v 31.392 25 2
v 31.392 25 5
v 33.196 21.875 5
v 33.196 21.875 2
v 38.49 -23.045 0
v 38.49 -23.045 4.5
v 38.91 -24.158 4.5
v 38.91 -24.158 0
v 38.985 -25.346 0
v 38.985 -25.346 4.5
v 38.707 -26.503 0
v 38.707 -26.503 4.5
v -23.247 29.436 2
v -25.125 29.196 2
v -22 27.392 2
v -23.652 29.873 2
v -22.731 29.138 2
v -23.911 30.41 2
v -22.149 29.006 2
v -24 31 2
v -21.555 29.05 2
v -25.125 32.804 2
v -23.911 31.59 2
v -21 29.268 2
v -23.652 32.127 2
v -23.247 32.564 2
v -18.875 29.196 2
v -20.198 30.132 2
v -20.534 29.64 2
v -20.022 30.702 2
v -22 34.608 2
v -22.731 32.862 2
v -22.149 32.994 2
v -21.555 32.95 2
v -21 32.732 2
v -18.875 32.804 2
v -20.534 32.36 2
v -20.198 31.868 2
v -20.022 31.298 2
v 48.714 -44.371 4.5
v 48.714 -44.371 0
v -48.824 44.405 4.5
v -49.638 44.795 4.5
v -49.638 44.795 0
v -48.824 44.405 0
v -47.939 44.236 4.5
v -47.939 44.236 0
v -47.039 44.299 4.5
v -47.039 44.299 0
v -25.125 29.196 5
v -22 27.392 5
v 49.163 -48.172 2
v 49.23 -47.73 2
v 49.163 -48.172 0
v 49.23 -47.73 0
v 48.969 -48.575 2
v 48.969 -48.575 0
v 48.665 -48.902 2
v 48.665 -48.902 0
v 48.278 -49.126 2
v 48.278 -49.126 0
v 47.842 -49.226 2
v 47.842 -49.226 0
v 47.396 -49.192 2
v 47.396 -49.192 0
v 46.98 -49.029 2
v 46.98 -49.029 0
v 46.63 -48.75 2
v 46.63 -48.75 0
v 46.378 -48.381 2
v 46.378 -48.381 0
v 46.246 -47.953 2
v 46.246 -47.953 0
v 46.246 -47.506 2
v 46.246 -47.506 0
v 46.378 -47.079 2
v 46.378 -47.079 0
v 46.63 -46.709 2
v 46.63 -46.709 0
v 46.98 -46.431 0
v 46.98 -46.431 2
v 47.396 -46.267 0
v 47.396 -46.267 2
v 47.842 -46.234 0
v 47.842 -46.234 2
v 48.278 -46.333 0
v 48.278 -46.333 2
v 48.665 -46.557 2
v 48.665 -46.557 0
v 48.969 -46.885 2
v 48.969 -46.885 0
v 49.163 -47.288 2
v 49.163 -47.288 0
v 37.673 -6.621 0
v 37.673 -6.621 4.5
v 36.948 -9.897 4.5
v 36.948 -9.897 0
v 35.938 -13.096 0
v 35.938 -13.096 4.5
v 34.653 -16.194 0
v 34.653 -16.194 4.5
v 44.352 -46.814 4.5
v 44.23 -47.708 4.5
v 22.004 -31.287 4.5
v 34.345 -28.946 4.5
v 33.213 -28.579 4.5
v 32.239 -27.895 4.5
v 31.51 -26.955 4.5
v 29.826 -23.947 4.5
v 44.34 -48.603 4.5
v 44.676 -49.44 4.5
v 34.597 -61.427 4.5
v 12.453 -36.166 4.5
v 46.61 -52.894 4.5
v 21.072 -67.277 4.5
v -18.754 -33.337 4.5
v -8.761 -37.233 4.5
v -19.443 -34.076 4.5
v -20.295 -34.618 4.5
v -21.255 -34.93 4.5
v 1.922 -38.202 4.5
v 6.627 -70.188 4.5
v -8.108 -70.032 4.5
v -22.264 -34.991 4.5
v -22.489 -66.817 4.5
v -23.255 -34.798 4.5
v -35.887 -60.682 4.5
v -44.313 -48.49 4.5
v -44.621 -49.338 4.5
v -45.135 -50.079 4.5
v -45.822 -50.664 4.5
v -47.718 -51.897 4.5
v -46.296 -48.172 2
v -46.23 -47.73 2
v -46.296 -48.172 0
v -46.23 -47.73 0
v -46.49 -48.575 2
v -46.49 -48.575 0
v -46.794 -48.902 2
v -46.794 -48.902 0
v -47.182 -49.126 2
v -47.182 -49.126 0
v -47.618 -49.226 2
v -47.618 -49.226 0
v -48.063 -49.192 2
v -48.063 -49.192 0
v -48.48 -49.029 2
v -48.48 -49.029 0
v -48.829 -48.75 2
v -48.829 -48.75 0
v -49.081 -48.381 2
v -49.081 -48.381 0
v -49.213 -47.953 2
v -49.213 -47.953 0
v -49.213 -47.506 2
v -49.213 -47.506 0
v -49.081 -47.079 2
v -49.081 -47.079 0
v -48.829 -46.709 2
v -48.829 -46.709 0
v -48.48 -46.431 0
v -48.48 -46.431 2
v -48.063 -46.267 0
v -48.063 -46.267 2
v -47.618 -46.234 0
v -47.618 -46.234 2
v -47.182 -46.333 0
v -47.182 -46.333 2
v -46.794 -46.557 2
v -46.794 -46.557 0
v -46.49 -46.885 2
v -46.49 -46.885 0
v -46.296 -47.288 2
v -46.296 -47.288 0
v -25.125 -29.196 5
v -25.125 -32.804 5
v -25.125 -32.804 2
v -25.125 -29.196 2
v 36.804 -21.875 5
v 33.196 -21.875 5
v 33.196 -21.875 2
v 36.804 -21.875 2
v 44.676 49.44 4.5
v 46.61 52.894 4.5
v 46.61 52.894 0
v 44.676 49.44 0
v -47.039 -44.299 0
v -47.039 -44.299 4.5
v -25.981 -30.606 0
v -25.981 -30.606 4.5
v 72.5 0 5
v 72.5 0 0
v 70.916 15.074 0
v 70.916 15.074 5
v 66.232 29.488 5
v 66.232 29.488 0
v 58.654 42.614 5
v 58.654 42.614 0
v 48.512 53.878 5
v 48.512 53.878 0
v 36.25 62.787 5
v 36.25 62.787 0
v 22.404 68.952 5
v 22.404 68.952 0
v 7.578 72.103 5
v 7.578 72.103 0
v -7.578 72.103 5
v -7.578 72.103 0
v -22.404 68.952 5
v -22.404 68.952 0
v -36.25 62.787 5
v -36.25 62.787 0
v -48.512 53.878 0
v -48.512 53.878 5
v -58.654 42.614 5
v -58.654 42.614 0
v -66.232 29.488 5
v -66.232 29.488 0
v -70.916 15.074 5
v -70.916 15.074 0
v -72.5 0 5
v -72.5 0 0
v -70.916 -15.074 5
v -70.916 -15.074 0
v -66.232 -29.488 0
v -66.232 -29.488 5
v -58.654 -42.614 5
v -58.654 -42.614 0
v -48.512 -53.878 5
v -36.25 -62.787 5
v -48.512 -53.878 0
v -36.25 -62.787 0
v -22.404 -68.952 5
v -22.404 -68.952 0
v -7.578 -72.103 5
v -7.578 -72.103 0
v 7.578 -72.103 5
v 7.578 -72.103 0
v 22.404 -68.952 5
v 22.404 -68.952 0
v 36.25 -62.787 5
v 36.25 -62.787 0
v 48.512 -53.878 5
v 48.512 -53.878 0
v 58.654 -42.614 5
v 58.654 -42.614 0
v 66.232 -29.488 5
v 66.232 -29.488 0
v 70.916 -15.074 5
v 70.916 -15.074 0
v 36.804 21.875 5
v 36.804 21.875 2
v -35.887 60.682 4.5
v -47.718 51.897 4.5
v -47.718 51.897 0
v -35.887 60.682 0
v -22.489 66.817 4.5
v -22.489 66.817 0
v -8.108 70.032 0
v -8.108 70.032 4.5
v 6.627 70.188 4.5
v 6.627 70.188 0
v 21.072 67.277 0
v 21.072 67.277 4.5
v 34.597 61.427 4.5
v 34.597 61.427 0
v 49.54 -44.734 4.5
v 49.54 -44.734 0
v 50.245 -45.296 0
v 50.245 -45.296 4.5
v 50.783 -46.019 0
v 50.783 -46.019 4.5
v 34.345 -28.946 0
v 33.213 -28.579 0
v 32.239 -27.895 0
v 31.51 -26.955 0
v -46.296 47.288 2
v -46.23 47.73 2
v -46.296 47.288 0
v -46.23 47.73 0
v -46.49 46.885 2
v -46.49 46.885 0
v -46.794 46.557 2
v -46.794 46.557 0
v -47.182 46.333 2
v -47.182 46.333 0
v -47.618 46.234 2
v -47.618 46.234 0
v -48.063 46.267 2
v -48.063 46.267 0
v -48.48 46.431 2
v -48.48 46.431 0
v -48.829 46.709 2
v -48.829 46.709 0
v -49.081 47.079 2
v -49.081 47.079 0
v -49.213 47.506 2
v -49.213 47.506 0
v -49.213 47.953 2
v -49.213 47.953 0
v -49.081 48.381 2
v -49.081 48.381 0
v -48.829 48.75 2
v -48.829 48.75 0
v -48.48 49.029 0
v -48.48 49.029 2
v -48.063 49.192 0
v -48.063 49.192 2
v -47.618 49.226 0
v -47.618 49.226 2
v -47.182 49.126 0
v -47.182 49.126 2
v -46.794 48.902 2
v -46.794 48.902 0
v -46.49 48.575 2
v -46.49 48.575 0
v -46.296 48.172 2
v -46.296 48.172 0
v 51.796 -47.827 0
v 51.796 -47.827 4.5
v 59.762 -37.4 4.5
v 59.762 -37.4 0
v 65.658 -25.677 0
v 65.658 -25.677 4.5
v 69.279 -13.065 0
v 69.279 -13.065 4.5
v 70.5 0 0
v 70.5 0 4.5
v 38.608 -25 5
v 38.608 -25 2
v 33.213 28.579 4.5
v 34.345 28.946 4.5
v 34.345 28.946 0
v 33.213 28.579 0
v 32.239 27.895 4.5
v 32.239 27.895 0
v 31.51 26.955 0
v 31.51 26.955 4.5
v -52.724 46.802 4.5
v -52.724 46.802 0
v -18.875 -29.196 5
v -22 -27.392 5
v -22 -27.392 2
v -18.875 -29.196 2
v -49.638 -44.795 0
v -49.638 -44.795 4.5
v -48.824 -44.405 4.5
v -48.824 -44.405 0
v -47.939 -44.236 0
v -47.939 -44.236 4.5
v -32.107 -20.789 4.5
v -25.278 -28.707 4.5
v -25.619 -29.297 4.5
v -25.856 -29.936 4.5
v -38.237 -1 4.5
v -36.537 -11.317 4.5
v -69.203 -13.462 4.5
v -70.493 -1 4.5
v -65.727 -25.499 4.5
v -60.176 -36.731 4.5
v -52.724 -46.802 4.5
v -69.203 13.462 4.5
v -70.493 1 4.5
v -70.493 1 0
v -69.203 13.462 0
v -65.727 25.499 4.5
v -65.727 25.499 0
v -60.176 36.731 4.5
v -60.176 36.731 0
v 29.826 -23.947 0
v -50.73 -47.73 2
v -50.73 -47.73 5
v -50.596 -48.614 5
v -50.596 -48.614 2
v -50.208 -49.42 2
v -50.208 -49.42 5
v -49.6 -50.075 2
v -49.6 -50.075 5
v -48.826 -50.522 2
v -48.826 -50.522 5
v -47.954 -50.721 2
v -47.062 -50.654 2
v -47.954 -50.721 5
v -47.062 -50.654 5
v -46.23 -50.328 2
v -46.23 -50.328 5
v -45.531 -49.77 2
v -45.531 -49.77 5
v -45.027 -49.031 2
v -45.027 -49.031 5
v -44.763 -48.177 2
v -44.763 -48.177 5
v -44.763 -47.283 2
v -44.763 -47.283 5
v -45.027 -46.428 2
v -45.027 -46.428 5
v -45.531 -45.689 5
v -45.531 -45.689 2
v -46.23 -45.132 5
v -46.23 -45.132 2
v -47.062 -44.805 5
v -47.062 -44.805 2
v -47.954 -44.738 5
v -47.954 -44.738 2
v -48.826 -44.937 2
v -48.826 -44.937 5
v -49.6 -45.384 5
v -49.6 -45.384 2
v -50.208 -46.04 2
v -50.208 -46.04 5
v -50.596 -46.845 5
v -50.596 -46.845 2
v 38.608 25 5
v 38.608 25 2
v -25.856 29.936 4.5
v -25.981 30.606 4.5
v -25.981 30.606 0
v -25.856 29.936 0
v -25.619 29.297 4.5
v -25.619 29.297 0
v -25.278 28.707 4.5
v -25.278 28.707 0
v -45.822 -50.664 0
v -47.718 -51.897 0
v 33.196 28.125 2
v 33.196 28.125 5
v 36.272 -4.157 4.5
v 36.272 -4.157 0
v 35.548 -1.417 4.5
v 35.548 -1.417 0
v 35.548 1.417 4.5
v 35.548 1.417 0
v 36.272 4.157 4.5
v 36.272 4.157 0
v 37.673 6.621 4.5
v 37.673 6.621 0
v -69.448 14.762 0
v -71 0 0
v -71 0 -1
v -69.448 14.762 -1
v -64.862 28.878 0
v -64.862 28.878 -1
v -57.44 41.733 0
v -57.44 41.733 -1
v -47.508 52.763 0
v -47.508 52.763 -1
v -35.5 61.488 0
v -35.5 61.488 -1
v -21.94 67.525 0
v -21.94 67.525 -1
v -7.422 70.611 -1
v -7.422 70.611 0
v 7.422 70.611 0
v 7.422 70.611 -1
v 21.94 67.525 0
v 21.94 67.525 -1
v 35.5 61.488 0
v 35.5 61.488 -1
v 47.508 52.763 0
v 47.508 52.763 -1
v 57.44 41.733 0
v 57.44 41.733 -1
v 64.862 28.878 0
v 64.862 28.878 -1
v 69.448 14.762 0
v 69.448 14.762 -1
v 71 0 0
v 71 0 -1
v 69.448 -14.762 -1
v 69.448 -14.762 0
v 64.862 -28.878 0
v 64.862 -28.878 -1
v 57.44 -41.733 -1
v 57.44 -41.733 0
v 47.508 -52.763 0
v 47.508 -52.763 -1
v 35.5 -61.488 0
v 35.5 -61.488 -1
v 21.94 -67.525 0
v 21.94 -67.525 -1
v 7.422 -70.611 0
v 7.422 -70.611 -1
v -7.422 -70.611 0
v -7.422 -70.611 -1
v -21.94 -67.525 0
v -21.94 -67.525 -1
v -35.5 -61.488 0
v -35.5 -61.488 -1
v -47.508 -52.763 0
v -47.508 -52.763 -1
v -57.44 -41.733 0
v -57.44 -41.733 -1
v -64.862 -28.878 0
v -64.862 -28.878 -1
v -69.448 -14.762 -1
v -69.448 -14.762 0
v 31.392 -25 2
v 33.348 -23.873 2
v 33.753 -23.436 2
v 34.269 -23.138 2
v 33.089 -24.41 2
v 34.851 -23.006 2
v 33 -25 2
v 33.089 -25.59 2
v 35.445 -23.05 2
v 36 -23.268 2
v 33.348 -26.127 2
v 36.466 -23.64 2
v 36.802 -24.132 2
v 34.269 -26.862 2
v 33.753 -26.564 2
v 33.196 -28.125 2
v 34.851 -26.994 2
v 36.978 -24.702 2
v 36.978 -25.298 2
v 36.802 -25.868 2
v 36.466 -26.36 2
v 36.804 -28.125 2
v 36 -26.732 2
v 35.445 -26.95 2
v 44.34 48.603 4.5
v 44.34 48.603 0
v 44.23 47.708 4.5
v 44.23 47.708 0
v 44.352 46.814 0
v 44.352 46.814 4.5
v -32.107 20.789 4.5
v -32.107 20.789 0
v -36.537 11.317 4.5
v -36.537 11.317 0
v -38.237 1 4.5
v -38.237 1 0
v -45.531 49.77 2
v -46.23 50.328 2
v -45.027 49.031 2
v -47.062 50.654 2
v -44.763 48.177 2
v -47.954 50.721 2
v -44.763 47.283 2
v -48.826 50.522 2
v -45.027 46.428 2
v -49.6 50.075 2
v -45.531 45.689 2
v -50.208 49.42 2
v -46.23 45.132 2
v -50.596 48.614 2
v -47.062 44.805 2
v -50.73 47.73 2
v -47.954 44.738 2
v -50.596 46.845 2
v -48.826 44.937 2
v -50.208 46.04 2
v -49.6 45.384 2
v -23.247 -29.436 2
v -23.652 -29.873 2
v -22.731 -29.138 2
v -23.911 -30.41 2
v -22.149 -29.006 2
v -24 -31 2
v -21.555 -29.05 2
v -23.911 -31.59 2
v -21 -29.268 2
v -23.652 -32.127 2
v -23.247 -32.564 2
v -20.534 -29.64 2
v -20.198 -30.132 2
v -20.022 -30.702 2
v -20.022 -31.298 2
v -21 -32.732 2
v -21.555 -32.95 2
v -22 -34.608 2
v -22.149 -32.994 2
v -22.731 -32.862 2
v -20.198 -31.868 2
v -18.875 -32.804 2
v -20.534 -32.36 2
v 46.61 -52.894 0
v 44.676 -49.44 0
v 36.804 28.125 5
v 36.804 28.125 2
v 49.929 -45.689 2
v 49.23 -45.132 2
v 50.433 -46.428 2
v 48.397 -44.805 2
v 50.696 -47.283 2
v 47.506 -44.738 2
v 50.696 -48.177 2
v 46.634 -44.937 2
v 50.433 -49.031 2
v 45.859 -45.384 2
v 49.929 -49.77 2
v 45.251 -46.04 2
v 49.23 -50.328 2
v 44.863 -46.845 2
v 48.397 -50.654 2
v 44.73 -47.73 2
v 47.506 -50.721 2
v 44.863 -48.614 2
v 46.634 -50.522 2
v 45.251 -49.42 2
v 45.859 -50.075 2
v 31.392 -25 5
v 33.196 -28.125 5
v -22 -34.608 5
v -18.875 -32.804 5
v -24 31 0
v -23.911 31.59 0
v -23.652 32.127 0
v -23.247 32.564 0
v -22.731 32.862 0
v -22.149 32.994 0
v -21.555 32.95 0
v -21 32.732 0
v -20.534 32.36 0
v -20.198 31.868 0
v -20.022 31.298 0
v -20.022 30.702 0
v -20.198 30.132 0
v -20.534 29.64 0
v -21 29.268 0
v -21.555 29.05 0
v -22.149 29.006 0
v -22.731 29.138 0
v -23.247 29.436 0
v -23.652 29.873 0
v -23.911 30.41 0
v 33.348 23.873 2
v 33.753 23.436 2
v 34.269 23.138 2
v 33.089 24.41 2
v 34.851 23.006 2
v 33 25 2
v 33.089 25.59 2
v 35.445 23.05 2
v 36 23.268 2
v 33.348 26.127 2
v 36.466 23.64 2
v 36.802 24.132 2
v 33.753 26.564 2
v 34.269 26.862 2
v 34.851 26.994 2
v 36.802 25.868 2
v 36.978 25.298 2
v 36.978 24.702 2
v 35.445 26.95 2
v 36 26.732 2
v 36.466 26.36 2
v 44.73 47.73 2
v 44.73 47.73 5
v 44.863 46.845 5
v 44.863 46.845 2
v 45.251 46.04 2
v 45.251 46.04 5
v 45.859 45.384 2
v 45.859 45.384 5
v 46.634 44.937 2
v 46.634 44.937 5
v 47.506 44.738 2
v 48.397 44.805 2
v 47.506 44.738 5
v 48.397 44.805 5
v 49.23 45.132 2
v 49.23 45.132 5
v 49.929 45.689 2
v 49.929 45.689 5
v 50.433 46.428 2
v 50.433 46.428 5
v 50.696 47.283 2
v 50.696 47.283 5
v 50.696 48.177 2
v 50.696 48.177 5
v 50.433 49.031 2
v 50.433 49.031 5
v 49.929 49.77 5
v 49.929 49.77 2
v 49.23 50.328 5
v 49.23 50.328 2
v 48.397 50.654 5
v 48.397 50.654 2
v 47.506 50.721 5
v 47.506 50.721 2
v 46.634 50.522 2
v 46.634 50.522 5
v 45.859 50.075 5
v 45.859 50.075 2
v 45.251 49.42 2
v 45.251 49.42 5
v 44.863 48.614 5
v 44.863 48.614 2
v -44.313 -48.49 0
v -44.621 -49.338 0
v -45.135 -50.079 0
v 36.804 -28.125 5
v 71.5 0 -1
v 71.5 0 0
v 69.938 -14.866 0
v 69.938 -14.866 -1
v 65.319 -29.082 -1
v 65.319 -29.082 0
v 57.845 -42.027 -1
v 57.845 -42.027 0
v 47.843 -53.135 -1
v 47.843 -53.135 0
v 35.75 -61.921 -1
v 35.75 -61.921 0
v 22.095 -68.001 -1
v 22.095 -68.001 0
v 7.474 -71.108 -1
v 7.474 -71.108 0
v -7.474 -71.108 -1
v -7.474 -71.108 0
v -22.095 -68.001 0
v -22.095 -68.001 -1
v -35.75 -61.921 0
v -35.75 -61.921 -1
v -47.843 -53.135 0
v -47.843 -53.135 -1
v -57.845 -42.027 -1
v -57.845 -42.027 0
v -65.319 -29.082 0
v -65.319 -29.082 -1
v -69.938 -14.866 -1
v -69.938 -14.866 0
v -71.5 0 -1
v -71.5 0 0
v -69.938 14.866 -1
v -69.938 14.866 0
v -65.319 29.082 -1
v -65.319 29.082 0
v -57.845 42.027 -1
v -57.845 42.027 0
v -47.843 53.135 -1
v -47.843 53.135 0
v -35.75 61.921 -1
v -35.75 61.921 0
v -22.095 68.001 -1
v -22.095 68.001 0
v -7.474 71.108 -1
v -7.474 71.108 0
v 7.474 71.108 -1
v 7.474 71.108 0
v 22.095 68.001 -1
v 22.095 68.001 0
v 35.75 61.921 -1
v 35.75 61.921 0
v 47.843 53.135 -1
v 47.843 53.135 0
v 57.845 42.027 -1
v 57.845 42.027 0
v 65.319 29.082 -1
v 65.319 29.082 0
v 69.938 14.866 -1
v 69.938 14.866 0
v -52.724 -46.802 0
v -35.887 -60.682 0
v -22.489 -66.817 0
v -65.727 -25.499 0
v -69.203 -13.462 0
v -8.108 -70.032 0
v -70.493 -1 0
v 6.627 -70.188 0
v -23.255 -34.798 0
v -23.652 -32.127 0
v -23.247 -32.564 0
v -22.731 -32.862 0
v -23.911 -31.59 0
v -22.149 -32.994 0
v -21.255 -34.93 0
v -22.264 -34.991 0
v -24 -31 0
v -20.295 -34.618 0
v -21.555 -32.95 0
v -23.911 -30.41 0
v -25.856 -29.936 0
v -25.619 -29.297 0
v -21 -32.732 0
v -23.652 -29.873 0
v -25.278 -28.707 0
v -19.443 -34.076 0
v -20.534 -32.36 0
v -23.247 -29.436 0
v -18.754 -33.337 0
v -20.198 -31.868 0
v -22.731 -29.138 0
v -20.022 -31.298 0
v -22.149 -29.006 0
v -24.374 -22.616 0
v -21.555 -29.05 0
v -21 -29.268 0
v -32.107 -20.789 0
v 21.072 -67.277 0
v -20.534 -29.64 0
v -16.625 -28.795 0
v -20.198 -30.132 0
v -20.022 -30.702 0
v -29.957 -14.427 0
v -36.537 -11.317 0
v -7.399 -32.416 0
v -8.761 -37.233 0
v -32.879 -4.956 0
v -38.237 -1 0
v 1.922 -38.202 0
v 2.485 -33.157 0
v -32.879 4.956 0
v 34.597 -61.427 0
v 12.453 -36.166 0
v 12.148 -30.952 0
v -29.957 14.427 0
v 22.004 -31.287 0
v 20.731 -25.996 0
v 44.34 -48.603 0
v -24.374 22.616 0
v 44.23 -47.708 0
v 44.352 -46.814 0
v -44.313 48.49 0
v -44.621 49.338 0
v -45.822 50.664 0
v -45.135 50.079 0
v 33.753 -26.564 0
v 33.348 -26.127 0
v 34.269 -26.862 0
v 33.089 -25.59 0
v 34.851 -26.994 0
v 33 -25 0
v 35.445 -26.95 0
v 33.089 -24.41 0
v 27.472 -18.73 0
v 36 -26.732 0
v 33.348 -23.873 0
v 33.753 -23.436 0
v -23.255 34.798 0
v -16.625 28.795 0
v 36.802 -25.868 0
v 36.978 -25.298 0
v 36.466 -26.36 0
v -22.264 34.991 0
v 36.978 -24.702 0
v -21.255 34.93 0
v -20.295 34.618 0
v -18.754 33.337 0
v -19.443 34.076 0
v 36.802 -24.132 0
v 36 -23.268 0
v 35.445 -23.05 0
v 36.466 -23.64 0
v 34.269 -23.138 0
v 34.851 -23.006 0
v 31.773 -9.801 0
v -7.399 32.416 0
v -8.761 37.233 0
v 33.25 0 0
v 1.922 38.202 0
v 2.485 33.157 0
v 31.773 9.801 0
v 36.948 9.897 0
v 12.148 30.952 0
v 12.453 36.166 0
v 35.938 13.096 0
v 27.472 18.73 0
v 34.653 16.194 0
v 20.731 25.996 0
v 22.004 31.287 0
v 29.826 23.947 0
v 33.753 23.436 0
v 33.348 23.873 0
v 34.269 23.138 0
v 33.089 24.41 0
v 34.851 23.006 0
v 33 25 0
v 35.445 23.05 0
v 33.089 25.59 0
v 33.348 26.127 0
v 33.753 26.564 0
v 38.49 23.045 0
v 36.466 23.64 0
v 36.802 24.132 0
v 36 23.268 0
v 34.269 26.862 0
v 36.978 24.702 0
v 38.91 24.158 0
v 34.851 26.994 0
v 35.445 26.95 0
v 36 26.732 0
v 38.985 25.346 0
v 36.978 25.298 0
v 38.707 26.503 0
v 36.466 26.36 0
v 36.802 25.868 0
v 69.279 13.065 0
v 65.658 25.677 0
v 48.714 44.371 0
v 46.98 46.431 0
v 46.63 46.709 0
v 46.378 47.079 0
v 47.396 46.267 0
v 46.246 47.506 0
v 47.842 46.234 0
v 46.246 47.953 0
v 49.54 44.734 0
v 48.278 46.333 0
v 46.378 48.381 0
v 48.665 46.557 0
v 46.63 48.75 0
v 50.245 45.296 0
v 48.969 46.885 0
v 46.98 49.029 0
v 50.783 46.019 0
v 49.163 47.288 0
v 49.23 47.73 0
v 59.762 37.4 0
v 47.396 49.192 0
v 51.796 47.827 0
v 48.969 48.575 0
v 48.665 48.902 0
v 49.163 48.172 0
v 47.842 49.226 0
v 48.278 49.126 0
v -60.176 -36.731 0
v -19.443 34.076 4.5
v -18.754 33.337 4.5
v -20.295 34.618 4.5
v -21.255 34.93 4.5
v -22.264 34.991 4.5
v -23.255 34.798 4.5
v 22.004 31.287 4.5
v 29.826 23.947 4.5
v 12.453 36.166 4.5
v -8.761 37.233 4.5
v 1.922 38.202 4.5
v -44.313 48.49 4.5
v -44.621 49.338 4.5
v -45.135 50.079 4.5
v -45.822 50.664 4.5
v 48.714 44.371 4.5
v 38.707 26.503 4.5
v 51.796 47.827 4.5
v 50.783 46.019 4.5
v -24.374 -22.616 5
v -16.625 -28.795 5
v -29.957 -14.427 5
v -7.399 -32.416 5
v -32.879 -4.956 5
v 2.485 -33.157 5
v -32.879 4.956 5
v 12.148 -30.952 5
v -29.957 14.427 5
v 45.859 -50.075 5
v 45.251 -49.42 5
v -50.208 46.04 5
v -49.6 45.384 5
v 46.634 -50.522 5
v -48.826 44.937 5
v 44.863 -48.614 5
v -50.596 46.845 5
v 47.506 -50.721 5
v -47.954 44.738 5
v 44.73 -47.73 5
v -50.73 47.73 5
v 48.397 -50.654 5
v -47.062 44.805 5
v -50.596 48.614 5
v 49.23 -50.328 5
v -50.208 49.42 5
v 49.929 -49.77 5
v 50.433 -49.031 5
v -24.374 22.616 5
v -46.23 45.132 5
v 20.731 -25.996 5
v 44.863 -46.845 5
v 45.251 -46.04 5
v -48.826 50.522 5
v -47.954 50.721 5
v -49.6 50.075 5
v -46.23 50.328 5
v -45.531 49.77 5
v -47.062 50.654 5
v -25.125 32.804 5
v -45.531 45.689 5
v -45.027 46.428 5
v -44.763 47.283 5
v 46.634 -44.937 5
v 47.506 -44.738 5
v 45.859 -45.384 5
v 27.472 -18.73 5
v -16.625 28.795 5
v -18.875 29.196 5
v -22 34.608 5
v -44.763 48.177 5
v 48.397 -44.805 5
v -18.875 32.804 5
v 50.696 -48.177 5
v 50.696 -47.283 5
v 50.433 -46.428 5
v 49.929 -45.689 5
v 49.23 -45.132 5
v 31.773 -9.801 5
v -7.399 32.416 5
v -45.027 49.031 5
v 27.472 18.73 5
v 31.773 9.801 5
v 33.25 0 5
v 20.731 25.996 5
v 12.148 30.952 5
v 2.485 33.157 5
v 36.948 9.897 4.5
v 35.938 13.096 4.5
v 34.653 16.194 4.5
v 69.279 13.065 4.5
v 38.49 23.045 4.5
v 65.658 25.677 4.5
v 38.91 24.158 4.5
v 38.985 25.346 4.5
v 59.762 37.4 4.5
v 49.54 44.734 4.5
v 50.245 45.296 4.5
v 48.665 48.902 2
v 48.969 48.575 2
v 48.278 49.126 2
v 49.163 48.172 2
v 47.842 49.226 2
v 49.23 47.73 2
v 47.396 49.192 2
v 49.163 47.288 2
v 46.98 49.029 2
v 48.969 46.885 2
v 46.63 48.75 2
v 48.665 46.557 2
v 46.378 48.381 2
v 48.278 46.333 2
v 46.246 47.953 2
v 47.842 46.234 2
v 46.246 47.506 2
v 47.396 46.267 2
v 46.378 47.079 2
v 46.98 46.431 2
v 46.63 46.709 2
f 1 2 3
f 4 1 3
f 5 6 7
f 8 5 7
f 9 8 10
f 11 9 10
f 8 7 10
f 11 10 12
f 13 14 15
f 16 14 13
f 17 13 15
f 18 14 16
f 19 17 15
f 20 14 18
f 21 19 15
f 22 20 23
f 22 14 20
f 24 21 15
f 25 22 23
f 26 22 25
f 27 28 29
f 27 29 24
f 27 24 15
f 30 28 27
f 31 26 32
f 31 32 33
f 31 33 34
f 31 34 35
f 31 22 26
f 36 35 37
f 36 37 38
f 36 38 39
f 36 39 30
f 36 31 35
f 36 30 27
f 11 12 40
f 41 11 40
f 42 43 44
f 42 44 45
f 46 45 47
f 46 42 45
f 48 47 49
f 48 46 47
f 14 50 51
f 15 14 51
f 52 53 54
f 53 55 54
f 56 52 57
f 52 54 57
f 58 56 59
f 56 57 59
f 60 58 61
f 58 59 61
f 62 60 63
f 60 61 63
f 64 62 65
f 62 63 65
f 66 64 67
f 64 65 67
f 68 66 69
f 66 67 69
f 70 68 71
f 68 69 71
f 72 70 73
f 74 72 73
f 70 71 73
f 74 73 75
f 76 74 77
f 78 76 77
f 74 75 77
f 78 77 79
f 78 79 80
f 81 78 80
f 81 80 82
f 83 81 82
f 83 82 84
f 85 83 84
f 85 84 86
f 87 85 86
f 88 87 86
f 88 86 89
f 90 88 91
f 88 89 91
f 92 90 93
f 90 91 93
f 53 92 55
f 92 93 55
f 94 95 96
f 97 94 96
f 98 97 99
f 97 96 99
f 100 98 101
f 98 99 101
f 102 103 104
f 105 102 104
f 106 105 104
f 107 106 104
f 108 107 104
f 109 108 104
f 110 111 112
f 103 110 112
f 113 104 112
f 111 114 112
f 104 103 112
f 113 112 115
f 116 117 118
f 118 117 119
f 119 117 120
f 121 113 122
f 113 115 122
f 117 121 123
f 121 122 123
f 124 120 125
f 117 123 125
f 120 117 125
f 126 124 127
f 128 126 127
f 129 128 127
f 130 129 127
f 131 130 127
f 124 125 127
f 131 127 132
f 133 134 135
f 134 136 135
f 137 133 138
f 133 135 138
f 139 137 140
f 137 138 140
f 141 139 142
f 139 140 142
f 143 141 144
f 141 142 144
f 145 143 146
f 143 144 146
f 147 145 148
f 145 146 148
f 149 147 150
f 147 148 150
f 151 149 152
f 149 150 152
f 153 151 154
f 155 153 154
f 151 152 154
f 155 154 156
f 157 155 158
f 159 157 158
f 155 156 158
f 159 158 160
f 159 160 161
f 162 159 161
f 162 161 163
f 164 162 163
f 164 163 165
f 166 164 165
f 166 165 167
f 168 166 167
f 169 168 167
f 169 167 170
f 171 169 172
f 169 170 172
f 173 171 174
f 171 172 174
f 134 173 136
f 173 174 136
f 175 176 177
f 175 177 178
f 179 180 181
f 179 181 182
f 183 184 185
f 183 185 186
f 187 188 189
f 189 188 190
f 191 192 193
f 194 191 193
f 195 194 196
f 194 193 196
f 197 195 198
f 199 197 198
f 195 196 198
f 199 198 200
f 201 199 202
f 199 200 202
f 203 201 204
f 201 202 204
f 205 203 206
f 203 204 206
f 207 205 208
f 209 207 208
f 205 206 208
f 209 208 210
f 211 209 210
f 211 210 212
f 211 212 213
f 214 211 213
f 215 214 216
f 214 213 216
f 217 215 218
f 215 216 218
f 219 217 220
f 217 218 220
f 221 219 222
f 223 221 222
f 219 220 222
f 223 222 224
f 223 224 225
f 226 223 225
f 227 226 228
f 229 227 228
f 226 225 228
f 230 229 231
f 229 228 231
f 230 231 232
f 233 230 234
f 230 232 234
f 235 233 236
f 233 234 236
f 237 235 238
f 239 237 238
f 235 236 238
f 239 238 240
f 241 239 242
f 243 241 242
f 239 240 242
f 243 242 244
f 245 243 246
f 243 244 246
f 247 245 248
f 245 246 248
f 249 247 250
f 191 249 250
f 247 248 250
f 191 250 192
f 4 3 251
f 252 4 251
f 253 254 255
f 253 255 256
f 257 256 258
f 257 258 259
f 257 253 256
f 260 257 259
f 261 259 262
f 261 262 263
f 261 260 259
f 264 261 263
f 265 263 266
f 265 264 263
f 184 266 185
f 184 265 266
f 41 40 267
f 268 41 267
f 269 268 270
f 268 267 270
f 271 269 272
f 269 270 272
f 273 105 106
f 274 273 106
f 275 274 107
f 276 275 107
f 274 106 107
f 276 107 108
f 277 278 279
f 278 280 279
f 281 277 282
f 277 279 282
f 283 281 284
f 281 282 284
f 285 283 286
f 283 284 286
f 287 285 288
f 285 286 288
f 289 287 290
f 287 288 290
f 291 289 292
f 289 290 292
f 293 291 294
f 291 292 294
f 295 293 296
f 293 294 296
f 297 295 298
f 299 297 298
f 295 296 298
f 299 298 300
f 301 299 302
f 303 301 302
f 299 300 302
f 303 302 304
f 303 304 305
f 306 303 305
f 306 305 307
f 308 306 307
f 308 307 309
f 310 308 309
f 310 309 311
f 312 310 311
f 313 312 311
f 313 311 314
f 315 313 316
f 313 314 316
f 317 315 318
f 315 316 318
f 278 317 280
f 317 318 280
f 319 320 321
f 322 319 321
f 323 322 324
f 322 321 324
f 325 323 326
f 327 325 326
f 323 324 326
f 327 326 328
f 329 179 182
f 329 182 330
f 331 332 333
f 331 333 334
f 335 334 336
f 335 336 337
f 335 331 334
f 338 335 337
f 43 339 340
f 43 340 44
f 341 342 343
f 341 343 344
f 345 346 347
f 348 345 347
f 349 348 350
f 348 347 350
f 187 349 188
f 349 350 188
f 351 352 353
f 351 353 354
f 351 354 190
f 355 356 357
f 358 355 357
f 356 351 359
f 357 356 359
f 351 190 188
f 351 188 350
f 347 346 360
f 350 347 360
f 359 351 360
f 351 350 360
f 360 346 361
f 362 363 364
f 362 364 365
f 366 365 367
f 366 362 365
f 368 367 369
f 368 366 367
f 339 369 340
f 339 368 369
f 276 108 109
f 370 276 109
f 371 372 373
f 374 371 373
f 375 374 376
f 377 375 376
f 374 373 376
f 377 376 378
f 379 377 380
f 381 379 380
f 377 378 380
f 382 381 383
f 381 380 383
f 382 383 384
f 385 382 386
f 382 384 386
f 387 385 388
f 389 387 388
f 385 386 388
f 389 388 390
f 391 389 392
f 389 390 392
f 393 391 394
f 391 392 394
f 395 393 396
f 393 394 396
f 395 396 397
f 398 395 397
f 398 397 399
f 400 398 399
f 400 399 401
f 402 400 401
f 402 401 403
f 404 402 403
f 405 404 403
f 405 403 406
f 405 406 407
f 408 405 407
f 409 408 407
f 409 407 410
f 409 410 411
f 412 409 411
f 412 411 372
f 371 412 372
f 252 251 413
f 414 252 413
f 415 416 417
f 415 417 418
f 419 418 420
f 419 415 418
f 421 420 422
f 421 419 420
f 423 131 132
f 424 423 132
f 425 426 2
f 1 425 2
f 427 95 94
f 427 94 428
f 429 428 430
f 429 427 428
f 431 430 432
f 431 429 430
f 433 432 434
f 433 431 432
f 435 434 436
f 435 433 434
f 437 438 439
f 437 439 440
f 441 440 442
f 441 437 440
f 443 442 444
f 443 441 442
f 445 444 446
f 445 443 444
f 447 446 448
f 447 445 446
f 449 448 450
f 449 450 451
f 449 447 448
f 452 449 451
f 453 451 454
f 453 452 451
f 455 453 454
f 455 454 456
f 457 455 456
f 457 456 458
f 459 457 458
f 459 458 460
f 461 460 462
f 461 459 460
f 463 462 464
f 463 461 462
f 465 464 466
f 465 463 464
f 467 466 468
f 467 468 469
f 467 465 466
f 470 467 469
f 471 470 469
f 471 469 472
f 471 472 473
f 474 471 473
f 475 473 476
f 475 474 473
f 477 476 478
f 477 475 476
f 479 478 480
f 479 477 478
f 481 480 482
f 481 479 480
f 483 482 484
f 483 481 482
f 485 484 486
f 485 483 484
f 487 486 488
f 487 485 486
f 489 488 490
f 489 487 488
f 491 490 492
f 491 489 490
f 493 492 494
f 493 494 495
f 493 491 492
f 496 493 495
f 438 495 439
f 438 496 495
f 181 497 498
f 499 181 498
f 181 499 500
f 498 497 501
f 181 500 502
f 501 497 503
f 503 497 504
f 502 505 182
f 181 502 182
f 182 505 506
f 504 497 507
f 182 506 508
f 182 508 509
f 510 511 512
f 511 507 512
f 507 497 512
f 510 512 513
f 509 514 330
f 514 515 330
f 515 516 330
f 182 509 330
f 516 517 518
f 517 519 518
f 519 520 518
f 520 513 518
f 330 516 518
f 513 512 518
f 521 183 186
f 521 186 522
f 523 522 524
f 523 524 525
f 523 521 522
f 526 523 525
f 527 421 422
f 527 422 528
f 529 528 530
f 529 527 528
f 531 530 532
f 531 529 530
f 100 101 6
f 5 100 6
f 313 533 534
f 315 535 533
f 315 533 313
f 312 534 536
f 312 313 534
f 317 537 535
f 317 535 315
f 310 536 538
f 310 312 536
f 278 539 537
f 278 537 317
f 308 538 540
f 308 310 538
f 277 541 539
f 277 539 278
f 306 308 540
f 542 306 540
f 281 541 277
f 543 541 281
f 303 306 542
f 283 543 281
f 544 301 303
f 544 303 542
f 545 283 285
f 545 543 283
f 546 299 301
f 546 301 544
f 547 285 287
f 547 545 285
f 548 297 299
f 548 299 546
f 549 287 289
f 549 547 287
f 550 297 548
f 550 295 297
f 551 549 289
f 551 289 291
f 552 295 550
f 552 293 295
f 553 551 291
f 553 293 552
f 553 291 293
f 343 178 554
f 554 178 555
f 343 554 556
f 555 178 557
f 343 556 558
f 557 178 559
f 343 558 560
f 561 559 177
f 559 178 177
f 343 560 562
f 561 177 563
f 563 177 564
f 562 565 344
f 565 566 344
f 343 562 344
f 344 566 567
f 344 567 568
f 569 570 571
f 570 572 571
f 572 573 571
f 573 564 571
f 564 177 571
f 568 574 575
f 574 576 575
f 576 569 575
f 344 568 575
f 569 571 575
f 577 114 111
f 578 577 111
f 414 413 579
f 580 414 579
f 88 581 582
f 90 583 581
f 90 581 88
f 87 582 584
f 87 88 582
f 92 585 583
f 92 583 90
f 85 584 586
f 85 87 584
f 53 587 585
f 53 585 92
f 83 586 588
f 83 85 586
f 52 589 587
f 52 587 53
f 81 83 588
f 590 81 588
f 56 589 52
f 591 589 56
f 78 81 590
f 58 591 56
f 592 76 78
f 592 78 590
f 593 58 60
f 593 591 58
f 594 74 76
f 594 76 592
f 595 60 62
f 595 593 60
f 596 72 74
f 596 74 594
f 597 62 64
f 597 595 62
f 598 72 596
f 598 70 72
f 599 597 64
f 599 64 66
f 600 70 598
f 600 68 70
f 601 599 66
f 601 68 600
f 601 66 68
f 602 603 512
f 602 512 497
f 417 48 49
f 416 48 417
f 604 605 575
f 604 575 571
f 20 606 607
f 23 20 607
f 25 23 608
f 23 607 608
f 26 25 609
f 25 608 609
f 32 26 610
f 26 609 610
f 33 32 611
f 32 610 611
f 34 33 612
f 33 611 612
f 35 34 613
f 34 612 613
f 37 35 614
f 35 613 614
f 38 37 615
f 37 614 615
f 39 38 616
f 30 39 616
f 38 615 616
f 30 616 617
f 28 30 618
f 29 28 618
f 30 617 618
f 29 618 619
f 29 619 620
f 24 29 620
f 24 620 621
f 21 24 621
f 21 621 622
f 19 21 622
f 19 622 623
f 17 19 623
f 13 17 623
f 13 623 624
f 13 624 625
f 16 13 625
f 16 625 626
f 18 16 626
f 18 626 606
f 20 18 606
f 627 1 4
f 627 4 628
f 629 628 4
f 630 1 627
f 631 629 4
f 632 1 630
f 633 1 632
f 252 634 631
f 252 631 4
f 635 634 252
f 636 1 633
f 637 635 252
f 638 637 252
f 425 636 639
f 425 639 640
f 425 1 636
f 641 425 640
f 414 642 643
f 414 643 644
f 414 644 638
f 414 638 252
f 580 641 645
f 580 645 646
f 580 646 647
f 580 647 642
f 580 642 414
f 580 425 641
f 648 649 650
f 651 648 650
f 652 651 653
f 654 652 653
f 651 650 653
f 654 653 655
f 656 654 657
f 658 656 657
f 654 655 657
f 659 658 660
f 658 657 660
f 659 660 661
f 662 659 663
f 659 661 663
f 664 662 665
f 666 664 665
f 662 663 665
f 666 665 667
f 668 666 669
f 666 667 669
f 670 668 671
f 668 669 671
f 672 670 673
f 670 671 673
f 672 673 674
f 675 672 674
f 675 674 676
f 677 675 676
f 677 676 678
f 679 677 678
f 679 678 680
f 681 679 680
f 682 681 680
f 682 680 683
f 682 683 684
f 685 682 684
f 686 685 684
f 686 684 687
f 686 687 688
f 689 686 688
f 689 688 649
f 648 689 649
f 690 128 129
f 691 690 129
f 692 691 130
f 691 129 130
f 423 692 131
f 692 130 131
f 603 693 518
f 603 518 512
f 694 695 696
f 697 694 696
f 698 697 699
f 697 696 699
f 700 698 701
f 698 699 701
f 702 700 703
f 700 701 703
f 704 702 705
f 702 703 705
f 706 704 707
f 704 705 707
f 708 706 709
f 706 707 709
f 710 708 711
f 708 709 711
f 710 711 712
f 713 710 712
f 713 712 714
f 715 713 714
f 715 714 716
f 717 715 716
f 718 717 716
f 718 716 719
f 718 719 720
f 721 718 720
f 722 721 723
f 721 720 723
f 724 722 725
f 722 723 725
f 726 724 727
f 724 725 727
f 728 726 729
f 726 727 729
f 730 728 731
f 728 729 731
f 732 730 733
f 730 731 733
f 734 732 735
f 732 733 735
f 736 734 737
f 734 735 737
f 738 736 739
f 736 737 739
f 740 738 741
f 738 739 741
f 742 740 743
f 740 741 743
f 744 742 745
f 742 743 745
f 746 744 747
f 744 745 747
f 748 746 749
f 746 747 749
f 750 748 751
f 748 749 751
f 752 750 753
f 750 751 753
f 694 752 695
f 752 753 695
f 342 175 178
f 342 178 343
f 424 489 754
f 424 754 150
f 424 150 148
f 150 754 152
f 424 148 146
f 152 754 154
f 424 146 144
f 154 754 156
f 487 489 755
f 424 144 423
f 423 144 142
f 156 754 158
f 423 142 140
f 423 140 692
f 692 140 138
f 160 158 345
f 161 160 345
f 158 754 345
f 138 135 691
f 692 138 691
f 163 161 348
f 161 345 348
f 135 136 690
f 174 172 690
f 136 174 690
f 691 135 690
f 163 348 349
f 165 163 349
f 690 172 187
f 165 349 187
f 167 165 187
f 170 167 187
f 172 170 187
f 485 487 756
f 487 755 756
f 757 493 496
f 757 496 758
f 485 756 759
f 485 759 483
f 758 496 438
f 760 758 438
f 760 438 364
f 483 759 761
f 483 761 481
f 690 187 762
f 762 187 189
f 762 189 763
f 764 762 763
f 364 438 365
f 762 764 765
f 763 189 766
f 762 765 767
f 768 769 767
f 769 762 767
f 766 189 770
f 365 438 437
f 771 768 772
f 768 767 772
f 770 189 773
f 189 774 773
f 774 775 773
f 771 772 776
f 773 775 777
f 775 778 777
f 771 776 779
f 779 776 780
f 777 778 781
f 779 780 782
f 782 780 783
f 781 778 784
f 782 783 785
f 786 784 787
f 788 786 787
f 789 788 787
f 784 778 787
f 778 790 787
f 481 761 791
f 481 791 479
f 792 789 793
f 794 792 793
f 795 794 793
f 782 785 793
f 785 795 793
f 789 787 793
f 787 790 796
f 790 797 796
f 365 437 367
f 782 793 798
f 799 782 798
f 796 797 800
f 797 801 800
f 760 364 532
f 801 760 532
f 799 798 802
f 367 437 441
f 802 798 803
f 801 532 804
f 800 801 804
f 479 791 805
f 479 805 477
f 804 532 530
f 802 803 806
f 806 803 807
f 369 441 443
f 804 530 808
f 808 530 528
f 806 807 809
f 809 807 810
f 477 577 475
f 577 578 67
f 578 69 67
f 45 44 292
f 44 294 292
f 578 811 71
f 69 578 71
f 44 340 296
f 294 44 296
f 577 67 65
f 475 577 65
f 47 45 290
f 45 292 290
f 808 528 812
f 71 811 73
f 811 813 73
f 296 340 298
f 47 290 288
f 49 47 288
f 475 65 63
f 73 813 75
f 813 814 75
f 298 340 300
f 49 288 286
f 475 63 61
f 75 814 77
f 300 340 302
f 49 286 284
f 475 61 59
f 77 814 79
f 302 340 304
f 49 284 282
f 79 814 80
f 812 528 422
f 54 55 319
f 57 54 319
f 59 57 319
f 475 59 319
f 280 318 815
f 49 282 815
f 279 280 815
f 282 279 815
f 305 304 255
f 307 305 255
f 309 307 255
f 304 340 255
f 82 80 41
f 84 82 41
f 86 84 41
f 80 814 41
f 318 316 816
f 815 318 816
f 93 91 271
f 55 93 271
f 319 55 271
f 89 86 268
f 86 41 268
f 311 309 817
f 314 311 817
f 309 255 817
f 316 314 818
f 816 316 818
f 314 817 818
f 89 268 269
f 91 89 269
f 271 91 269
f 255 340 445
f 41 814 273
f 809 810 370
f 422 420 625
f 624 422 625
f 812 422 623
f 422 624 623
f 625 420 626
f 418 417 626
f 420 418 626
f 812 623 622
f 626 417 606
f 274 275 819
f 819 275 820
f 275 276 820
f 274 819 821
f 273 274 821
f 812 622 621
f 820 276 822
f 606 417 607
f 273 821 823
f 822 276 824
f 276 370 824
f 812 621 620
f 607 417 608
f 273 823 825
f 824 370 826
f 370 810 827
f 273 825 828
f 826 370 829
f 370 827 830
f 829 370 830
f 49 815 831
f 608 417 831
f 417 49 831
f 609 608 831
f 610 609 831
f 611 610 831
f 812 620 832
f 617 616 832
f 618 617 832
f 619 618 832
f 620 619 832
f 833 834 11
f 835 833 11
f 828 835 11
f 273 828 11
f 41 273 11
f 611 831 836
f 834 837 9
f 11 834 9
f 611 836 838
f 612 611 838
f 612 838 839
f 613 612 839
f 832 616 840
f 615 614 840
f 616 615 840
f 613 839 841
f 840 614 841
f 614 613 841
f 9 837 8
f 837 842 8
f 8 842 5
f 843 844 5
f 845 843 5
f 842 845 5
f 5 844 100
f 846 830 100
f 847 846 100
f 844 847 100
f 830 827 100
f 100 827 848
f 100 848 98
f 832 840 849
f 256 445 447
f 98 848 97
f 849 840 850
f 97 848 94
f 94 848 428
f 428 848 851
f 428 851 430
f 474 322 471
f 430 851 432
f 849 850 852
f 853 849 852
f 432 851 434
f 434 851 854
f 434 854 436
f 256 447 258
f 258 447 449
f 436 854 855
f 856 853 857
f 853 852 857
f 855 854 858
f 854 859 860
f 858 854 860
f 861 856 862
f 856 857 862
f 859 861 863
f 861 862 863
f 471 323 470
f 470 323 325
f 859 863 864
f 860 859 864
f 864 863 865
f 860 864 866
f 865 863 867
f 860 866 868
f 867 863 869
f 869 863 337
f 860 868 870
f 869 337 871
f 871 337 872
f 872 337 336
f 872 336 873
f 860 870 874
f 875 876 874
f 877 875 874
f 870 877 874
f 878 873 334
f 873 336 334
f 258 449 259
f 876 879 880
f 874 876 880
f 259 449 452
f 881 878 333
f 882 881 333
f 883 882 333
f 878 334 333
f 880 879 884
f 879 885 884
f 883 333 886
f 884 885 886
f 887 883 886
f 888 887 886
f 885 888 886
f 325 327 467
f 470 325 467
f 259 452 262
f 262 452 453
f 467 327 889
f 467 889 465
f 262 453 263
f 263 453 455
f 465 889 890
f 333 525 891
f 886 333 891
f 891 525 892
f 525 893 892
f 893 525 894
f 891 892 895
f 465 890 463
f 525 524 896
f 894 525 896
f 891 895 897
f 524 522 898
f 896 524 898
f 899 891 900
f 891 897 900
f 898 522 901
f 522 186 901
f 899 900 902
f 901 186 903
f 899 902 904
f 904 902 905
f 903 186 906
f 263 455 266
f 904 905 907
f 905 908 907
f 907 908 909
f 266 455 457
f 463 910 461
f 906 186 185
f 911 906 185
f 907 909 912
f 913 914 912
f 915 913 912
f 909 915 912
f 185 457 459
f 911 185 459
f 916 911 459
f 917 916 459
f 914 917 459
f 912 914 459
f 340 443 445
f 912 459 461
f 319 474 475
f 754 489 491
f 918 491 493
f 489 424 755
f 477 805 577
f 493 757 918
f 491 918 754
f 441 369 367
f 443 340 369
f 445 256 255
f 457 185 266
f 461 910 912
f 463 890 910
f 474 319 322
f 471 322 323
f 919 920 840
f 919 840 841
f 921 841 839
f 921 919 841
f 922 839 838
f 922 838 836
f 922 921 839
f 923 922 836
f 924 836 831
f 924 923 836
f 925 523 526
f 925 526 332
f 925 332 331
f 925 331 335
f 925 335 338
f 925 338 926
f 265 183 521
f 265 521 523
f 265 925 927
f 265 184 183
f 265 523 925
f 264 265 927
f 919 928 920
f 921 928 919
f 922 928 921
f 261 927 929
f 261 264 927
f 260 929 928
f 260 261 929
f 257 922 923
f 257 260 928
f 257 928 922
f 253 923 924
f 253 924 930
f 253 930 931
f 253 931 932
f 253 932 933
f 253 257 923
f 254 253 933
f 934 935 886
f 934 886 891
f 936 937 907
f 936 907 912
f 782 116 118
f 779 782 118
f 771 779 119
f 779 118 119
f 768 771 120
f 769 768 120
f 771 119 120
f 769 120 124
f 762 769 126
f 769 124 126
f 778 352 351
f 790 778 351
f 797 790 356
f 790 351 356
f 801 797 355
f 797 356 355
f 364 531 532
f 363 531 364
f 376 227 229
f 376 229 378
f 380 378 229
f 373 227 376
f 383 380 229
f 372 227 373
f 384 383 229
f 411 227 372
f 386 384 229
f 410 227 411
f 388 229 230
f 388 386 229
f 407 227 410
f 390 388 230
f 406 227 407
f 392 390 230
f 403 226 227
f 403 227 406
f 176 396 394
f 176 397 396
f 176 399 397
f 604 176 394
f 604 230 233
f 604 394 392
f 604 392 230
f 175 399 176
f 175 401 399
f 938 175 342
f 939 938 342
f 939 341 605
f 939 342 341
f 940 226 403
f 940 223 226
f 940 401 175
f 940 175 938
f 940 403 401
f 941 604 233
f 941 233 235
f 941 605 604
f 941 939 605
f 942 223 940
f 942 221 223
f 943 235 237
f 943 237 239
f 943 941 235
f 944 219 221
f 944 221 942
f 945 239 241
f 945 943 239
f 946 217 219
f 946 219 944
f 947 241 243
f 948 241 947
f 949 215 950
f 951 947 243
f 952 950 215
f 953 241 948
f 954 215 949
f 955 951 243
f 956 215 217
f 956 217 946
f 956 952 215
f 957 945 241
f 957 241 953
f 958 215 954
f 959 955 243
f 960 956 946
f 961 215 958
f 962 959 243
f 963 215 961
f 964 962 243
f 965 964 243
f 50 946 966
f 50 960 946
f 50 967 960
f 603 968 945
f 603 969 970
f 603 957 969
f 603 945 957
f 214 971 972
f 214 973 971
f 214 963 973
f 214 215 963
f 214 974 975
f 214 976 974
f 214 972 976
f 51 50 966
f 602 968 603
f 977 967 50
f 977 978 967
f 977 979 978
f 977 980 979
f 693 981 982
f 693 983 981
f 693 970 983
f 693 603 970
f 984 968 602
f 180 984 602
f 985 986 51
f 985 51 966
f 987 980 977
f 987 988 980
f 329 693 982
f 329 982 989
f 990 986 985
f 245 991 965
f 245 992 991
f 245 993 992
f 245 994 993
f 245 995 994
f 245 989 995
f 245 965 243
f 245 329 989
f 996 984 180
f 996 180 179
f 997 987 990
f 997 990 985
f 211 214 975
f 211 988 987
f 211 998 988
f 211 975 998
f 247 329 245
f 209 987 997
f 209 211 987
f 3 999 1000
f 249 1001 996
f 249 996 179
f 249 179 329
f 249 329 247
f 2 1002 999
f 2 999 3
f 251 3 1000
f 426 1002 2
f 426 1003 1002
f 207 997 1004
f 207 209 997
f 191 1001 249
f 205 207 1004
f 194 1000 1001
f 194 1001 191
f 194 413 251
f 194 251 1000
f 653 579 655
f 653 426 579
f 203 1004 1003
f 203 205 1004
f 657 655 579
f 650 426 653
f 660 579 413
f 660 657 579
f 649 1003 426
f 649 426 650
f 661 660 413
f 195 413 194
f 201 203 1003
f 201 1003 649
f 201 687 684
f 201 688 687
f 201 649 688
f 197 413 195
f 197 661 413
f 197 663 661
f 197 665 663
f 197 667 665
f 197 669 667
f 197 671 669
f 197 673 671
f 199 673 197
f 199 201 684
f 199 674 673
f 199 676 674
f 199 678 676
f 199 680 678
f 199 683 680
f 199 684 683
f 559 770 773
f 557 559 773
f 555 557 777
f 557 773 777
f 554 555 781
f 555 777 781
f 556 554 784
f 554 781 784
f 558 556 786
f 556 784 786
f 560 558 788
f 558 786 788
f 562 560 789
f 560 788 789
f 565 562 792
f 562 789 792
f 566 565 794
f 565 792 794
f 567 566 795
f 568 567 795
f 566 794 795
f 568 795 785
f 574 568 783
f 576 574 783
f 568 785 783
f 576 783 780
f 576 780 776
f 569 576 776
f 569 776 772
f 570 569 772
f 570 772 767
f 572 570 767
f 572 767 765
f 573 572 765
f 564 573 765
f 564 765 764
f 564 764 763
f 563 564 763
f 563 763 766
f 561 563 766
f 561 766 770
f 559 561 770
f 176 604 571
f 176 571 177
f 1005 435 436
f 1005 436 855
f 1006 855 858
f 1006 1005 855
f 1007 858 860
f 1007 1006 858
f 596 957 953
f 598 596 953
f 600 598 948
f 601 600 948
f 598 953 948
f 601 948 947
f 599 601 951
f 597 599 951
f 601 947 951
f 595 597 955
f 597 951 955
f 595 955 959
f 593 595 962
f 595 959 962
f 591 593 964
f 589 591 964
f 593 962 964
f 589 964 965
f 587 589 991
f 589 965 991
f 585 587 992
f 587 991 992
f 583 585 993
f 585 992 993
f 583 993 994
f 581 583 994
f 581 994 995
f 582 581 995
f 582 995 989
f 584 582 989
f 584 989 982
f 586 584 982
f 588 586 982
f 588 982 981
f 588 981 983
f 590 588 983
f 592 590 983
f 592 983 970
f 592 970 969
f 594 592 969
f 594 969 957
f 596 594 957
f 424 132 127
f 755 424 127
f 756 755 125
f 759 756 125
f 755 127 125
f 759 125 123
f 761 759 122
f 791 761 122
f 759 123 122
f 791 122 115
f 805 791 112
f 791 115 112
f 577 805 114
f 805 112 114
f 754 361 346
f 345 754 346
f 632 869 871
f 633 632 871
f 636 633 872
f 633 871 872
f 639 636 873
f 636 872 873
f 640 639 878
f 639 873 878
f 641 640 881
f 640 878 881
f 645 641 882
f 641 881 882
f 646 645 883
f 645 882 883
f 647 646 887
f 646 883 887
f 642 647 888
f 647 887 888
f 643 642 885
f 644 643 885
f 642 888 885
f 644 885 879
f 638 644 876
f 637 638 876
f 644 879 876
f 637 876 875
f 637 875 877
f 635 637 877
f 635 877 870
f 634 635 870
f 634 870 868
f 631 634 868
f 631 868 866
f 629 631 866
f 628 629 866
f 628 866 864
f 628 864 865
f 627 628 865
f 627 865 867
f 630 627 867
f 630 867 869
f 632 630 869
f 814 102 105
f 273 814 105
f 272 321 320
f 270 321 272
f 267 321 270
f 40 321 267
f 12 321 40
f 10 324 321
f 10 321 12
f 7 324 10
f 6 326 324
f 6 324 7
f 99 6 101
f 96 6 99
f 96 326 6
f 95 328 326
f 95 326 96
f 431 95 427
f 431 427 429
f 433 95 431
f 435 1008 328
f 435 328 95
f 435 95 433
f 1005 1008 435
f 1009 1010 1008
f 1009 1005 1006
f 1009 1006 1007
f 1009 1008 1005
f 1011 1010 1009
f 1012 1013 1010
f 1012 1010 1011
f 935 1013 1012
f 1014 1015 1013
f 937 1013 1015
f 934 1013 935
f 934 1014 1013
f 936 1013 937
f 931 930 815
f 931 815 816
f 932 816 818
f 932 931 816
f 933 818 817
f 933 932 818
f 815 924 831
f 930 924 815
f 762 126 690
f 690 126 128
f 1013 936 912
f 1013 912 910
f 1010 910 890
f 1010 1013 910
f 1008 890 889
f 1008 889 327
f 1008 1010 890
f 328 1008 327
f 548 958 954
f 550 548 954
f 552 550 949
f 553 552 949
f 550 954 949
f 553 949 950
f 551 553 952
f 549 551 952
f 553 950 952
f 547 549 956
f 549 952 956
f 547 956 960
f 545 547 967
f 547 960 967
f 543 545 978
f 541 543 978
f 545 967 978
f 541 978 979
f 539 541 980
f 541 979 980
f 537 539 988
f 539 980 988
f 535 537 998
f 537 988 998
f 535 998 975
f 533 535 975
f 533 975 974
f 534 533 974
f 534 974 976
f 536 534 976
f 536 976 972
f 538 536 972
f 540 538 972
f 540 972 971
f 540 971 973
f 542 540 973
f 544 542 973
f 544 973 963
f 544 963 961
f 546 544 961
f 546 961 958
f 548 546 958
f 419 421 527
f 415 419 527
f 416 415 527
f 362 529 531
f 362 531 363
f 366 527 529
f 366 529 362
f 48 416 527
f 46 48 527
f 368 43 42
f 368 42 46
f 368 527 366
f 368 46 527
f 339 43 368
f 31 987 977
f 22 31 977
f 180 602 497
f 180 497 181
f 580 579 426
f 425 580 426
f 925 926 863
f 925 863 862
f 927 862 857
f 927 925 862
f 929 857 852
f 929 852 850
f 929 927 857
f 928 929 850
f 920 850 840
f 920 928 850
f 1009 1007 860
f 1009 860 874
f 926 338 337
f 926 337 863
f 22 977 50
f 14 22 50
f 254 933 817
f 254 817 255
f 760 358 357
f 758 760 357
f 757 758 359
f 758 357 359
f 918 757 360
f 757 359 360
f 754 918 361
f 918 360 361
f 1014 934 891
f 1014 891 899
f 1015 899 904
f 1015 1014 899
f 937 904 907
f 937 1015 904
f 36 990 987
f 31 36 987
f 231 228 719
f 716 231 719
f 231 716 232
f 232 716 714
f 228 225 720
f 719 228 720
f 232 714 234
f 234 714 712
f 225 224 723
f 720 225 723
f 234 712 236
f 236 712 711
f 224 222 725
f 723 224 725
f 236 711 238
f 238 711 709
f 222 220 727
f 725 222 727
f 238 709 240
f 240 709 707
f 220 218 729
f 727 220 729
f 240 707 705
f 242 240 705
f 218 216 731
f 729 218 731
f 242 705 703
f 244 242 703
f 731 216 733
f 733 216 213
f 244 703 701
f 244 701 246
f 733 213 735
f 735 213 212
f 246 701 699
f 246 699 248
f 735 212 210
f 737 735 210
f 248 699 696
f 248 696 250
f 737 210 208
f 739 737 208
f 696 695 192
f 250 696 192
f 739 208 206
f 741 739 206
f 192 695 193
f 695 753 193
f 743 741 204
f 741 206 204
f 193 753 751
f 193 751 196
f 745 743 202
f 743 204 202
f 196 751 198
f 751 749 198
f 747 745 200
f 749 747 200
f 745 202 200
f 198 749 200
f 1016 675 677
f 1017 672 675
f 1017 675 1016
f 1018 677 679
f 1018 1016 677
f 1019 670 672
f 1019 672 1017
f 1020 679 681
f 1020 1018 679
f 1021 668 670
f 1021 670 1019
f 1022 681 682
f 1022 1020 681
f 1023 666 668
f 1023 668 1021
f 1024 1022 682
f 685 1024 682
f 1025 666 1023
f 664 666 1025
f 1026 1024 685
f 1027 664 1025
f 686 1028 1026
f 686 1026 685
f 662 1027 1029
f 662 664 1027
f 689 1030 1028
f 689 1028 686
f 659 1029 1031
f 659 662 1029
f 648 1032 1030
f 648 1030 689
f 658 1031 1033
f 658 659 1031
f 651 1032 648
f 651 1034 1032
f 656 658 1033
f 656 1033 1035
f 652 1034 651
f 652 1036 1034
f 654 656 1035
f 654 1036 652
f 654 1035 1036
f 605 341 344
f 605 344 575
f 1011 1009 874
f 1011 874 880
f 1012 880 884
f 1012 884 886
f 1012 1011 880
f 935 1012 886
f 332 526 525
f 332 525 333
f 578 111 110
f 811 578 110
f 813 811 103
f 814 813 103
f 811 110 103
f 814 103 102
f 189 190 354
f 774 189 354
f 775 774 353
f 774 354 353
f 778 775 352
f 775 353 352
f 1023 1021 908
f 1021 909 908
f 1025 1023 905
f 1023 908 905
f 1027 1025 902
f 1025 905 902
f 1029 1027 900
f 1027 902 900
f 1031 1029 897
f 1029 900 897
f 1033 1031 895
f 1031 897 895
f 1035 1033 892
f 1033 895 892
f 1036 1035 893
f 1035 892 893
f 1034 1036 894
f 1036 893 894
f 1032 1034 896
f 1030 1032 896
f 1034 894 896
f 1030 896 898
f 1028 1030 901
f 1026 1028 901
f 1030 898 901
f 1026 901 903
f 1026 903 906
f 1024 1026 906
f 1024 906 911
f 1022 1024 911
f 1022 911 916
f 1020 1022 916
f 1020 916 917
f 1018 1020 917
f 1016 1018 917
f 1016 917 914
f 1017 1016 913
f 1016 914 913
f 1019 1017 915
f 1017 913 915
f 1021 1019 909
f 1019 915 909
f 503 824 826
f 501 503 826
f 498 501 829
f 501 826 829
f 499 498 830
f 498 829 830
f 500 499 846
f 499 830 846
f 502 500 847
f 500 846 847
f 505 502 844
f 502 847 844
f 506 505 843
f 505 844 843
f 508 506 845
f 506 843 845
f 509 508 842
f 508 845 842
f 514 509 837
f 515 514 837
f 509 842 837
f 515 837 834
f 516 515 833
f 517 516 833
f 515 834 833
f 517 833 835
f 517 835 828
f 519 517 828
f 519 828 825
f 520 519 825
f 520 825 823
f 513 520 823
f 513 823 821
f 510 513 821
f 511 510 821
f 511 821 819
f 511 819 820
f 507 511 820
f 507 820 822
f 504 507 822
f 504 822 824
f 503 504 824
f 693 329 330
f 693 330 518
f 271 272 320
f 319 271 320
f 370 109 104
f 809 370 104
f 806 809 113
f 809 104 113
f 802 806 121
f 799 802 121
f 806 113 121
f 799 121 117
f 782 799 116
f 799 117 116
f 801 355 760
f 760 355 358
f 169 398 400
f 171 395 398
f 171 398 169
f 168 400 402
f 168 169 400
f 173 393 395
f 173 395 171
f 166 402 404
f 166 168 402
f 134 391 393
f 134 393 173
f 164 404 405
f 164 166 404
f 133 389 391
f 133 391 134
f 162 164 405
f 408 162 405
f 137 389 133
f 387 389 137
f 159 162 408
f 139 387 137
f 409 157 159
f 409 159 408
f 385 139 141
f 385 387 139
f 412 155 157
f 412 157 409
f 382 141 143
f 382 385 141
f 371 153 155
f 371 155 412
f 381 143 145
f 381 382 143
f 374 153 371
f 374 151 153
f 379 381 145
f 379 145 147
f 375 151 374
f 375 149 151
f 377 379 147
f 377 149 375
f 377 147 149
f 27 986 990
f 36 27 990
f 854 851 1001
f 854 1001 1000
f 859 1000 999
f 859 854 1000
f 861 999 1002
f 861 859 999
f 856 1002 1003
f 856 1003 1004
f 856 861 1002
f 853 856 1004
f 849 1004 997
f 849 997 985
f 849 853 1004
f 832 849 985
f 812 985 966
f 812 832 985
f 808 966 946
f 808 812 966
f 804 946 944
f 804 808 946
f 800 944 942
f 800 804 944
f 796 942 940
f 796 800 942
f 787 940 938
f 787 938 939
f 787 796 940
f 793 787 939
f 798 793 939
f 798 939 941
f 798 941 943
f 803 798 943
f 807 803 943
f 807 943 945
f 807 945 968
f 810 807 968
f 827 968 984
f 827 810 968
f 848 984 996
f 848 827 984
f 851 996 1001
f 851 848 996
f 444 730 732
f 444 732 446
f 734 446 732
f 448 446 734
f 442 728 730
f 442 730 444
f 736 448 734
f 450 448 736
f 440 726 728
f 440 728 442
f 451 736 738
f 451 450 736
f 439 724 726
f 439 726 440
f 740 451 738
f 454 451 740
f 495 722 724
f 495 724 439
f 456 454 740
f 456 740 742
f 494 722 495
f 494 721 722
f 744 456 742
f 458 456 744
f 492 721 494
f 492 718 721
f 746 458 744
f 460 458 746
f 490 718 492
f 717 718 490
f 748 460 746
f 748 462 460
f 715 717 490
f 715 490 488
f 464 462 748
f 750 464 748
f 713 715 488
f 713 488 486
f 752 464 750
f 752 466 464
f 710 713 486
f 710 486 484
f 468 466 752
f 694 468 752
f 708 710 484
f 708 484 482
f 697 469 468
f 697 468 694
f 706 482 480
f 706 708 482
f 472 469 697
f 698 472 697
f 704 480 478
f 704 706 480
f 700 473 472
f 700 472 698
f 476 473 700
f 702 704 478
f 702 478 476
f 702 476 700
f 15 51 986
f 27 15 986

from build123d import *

# Parameters (mm, degrees)
SKIZZE1_R                 = 72.5
SKIZZE1_R_2               = 33.25
LIDAR_TOP_BASE_DEPTH      = 5
LIDAR_SCREWS_D            = 4
SPACER_SCREWS_D           = 3
SPACER_SCREWS_CBORE_D     = 6
SPACER_SCREWS_CBORE_DEPTH = 3
BOTTOM_START              = -4.5
BOTTOM_STRUCTURE_DEPTH    = 4.5
HEX_NUT_DEPTH             = 3
SKIZZE7_R                 = 71.5
SKIZZE7_R_2               = 71
COVER_RING_DEPTH          = 1


with BuildPart() as part:
    # Skizze1 → Lidar Top Base (new body)
    with BuildSketch(Plane.XY):
        Circle(SKIZZE1_R)
        Circle(SKIZZE1_R_2, mode=Mode.SUBTRACT)
    extrude(amount=LIDAR_TOP_BASE_DEPTH)

    # Lidar Screws (through all)
    with Locations(Plane.XY.offset(5)):
        with Locations((-22, 31), (35, 25), (35, -25), (-22, -31)):
            Hole(LIDAR_SCREWS_D / 2)

    # Spacer Screws (through all)
    with Locations(Plane(origin=(0, 0, 5), x_dir=(-1, 0, 0), z_dir=(0, 0, 1))):
        with Locations((47.72970773, -47.72970773), (47.72970773, 47.72970773), (-47.72970773, 47.72970773), (-47.72970773, -47.72970773)):
            CounterBoreHole(SPACER_SCREWS_D / 2, SPACER_SCREWS_CBORE_D / 2, SPACER_SCREWS_CBORE_DEPTH)

    # Skizze6 → Bottom Structure (cut)
    with BuildSketch(Plane(origin=(0, 0, 0), x_dir=(-1, 0, 0), z_dir=(0, 0, -1)).offset(BOTTOM_START)):
        with BuildLine():
            ThreePointArc((-44.67599804, 49.439929098), (-44.256119002, 48.158871274), (-44.351580895, 46.814142832))
            Line((-44.351580895, 46.814142832), (-34.344540081, 28.945931106))
            ThreePointArc((-34.344540081, 28.945931106), (-32.700538124, 28.272991763), (-31.510046068, 26.954538706))
            Line((-31.510046068, 26.954538706), (-29.825905448, 23.947397859))
            ThreePointArc((-29.825905448, 23.947397859), (-7.258760505, 37.554931713), (18.753747138, 33.337058483))
            ThreePointArc((18.753747138, 33.337058483), (20.765145539, 34.804620146), (23.255008426, 34.798019728))
            Line((23.255008426, 34.798019728), (44.31336561, 48.490369623))
            ThreePointArc((44.31336561, 48.490369623), (44.854292699, 49.725199749), (45.821815788, 50.663979077))
            Line((45.821815788, 50.663979077), (47.717721333, 51.896715414))
            ThreePointArc((47.717721333, 51.896715414), (0.745045066, 70.496063066), (-46.61023353, 52.893630338))
            Line((-46.61023353, 52.893630338), (-44.67599804, 49.439929098))
        make_face()
        with BuildLine():
            Line((-38.706982496, 26.502757723), (-48.714023309, 44.370969449))
            ThreePointArc((-48.714023309, 44.370969449), (-49.910490622, 44.992156639), (-50.78341742, 46.019486362))
            Line((-50.78341742, 46.019486362), (-51.795828593, 47.827211296))
            ThreePointArc((-51.795828593, 47.827211296), (-65.657657268, 25.677267029), (-70.5, 0))
            Line((-70.5, 0), (-57.456439237, 0))
            ThreePointArc((-57.456439237, 0), (-42.965235741, -10.431275001), (-37.672530483, 6.621400682))
            ThreePointArc((-37.672530483, 6.621400682), (-36.478038354, 11.507181142), (-34.652808242, 16.193992125))
            Line((-34.652808242, 16.193992125), (-38.489953932, 23.045461294))
            ThreePointArc((-38.489953932, 23.045461294), (-38.992142049, 24.749397), (-38.706982496, 26.502757723))
        make_face()
        with BuildLine():
            ThreePointArc((49.637599672, 44.795436383), (48.387022114, 44.291984966), (47.038925526, 44.298553413))
            Line((47.038925526, 44.298553413), (25.980568343, 30.606203517))
            ThreePointArc((25.980568343, 30.606203517), (25.751268172, 29.611480247), (25.277654247, 28.707188922))
            ThreePointArc((25.277654247, 28.707188922), (34.647475396, 16.205398751), (38.23692587, 1))
            Line((38.23692587, 1), (70.492907445, 1))
            ThreePointArc((70.492907445, 1), (65.727115081, 25.498947882), (52.72387838, 46.802164998))
            Line((52.72387838, 46.802164998), (49.637599672, 44.795436383))
        make_face()
    bottom_structure = extrude(amount=BOTTOM_STRUCTURE_DEPTH, mode=Mode.SUBTRACT)

    # Skizze9 → Hex Nut (cut)
    with BuildSketch(Plane.XY.offset(5)):
        Polygon((-18.875, 32.804219591), (-22, 34.608439182), (-25.125, 32.804219591), (-25.125, 29.195780409), (-22, 27.391560818), (-18.875, 29.195780409), align=None)
        Polygon((38.608439182, 25), (36.804219591, 28.125), (33.195780409, 28.125), (31.391560818, 25), (33.195780409, 21.875), (36.804219591, 21.875), align=None)
    hex_nut = extrude(amount=-HEX_NUT_DEPTH, mode=Mode.SUBTRACT)

    # Structure Mirror: Bottom Structure, Hex Nut across plane
    add(bottom_structure.mirror(Plane.ZX), mode=Mode.SUBTRACT)
    add(hex_nut.mirror(Plane.ZX), mode=Mode.SUBTRACT)

    # Skizze7 → Cover Ring (add)
    with BuildSketch(Plane(origin=(0, 0, 0), x_dir=(-1, 0, 0), z_dir=(0, 0, -1))):
        with Locations(Location((0, 0, 0), (0, 0, 180))):
            Circle(SKIZZE7_R)
        Circle(SKIZZE7_R_2, mode=Mode.SUBTRACT)
    extrude(amount=COVER_RING_DEPTH)


solid = part.part
